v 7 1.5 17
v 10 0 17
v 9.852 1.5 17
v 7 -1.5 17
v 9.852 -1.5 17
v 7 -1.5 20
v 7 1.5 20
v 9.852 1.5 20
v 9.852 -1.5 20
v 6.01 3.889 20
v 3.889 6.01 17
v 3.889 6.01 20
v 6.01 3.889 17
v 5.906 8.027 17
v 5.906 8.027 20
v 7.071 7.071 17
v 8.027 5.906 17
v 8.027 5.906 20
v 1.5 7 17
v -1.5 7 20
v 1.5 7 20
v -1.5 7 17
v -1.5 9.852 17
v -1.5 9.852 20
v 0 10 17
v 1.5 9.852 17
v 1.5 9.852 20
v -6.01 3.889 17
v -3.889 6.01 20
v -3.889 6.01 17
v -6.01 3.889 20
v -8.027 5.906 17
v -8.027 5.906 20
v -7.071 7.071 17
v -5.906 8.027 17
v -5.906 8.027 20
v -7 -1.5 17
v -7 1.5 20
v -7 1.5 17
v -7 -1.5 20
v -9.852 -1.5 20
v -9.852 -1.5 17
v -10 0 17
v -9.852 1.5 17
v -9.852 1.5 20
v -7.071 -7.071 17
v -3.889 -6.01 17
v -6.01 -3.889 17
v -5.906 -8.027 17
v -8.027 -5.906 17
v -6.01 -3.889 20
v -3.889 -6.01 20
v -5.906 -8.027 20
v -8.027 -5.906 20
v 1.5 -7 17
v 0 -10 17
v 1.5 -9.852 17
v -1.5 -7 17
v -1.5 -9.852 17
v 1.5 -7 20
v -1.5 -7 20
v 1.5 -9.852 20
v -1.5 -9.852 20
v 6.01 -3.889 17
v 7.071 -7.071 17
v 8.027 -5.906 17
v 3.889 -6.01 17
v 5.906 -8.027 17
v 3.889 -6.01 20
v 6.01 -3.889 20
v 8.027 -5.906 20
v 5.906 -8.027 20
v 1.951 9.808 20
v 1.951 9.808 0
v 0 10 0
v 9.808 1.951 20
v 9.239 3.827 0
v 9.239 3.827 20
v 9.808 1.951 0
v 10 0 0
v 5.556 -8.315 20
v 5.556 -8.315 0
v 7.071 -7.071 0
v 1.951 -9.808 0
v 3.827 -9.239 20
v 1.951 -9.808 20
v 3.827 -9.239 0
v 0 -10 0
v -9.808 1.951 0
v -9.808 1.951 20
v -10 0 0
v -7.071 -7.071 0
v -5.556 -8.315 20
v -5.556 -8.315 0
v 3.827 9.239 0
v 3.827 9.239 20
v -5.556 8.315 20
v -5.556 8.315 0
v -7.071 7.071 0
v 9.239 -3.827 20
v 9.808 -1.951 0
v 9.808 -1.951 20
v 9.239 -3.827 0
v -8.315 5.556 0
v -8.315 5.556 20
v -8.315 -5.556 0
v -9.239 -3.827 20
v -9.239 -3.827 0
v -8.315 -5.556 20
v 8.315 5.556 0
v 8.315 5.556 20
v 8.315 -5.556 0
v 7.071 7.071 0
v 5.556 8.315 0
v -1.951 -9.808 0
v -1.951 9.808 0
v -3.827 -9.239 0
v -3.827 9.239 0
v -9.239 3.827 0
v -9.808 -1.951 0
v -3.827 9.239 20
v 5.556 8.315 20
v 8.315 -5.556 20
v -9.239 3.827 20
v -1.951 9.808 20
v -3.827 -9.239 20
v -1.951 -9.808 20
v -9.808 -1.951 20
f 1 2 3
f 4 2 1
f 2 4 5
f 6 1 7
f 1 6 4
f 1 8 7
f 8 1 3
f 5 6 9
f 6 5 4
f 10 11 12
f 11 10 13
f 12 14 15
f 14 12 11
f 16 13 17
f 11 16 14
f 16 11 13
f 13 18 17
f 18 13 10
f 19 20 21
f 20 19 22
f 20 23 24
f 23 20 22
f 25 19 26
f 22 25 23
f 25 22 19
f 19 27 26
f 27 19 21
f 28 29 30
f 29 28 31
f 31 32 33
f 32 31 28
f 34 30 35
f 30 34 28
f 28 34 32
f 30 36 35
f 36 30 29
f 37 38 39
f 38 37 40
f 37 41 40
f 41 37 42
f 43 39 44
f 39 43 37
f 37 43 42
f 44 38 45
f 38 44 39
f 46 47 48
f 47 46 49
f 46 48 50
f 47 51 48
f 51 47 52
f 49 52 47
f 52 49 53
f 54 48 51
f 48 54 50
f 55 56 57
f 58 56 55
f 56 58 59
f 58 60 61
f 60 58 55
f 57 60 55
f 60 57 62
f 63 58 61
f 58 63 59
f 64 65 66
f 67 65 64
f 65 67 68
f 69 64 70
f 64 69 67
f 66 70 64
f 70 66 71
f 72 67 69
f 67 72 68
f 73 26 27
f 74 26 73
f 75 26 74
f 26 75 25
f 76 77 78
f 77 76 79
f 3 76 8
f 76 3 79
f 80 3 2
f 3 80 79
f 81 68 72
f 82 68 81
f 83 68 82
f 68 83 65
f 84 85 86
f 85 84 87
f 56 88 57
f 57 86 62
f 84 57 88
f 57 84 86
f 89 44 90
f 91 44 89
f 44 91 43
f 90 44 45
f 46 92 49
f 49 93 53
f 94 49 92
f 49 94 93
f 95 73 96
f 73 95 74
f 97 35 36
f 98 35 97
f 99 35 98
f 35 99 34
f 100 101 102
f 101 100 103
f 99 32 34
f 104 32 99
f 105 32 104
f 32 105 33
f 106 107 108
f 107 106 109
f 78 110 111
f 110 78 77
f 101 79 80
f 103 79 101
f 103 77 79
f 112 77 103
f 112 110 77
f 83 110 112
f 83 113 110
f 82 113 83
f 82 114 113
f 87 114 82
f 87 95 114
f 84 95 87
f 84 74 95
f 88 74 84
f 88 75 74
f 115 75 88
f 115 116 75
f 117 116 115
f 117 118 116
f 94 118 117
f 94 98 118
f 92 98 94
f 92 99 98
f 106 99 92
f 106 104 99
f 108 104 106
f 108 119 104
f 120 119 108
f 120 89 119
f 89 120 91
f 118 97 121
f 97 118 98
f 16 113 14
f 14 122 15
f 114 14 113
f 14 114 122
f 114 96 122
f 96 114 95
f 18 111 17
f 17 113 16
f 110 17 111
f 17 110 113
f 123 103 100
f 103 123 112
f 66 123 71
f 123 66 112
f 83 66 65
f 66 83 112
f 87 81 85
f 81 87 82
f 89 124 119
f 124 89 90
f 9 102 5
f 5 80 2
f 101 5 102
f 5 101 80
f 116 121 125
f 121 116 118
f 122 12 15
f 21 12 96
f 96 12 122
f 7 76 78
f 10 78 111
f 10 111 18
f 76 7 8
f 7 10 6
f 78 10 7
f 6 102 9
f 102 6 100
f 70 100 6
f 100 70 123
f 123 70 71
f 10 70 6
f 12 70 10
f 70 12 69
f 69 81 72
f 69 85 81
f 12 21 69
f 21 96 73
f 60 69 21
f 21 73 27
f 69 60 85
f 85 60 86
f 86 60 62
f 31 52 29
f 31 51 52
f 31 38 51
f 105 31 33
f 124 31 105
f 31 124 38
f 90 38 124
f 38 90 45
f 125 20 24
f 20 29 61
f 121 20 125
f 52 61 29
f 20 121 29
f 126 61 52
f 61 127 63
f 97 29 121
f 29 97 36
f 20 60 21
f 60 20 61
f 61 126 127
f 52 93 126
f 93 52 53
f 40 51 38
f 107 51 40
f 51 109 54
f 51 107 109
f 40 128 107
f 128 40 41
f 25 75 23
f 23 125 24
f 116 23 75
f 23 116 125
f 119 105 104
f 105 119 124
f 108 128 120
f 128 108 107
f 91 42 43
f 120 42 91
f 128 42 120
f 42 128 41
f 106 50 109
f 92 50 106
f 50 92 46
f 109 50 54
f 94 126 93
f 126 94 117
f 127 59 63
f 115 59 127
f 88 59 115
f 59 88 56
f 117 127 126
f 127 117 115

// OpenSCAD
// A cylinder whose rim is notched, so the wall is trimmed but exactly.
//
// The band recogniser writes a wall as a run of facets between two rims, and
// it needs both rims whole. Notch the top one and it has nothing to work
// with - but the wall itself is untouched, every corner of every facet still
// sits on the cylinder the model declared, and there is nothing approximate
// about writing it as that cylinder.
//
// That is the distinction this fixture exists to hold. Recognising a trimmed
// quadric used to be gated behind the approximation flag as a whole, on the
// grounds that a trim's vertices are not all on the surface. Some are and some
// are not, and which is a question the mesh answers: a boolean puts its new
// vertices on the facet planes rather than on the ideal surface, so it is the
// fringe where the cut landed that strays, and the interior does not. A region
// whose every corner is on the surface to 1e-7 asserts nothing the mesh does
// not already state, and it belongs in the exact pass.
//
// The notches are 3 wide against a chord of 1.96, so each one crosses a vertex
// and eats into the two facets either side. Those facets are the fringe: their
// cut corners are at radius 9.85, not 10, and they stay planar. The sixteen
// facets nowhere near a notch are written as the cylinder.
//
// Eight faces of two facets, not one face of sixteen, and that is the second
// thing this fixture holds. The eight surviving stretches of wall are eight
// separate regions of one cylinder, and a face cannot be in two places: written
// as one ADVANCED_FACE they would be one face with eight outer loops, seven of
// them labelled holes in the largest, which is not a face. This fixture was
// written before that was understood and asserted the wrong number.
//
// EXPECT: 1 analytic surface available (1 cylindrical, 0 spherical, 0 toroidal, 0 Bezier)
// EXPECT: 8 trimmed quadrics written as one face each, replacing 16 facets (exactly on their surface)
// EXPECT-NOT: within their tessellation band
// ROUNDTRIP: Cylinder=8 Plane=50
// RADII: Cylinder=10
//
// Nothing here is approximated, so the kernel has no slack to take up. This is
// the assertion the rest of the fixture is scaffolding for: every edge lies on
// both faces it bounds, and a kernel that has to widen a tolerance to sew the
// file is telling us it does not. It is what an exact pass is *for*, and it is
// checked nowhere else, because until this face existed the exact pass only
// ever wrote bands - whose bounds are rim circles and rulings, and so were
// exact whether anyone had thought about it or not.
//
// 1e-7 is OpenCASCADE's own floor, Precision::Confusion, and it reports that
// for a shape it did not have to open up at all. There is no smaller number to
// ask for, and it is the first fixture here to ask for any.
// TOLERANCE: 1e-07
//
// The volume is derived. The mesh is a 32-gonal prism, area n*r^2*sin(2*pi/n)/2
// over h=20, which is 6242.890305, less eight notches. A notch is the box
// x in [7,13], y in [-1.5,1.5] cut over the 3 of its height that is inside the
// solid; theta = 0 is a vertex, so within |y| <= 1.5 the prism's boundary is
// two straight edges running from (9.852263, -1.5) through (10, 0) and back
// out, and the area between them and x = 7 is 8.778394. Eight of those over a
// depth of 3 remove 210.681464, leaving a mesh of 6032.208840.
//
// Writing sixteen facets as the cylinder then puts back the circular segment
// each of them cuts off: r^2*(theta - sin theta)/2 = 0.062961 per unit height,
// over 16 facets of height 20, so 20.147502. The export is 6052.356342, and
// OpenCASCADE measuring the file agrees to the six figures it prints - which is
// what says the derivation is right rather than merely repeatable.
// VOLUME: 6052.356342 +/- 0.001
//
// The approximation tier asserted nothing at all until the corner placement
// reached this model, which meant the whole of the following was free to
// regress in silence.
//
// Each notch is a box cut through the rim, and where its two faces meet the
// declared cylinder is a corner of three exact things: the cylinder, the
// notch's floor at z = 17, and one of its sides at y = +/-1.5. That is two
// corners on the floor and two more where the notch opens onto the top at
// z = 20 - four to a notch, and eight notches, so 32. Placed, they sit on the
// cylinder rather than on the chord plane the mesh cut them on, which is a
// move of up to 10*(1 - cos(pi/32)) = 0.048163.
//
// The rest of the corners on that cylinder are the 32-gon's own vertices, which
// were on it already. So the file's 96 vertices at radius 10 are every vertex
// the cylinder carries, and *none* sits at the inradius 9.951847 - which is the
// property this whole tier exists to hold and the one a chord left behind would
// break.
// APPROX: 32 corners where a declared surface meets two faces of the model are placed where all three cross
//
// Every facet its maker named for a declared surface is D0 by that heritage,
// whole or cut, and has to end in a face written on that surface (checklist
// B6, B7, E8). A facet a boolean cut is not in its surface's D0 region yet -
// the region holds whole facets only - so nothing proposes it at the exact
// tier, and at the approximation tier a statistic over the tessellation
// refuses it (C3). Measured 2026-09-29:
//   exact tier, 16 facets (16 cut): 16 on cylinder 0 (claimed by nothing for it)
// Tolerated by name until cut facets join their region and no statistic
// vetoes a named facet (doc/step-export-wip.md, open item 34); the test
// fails the day it is no longer raised.
// KNOWN-EXPORT-ERROR: facets named by their maker for a declared surface are not written on it
$fn = 32;
difference() {
	cylinder(r = 10, h = 20);
	for (i = [0:7]) rotate([0, 0, i * 45]) translate([10, 0, 20]) cube([6, 3, 6], center = true);
}
